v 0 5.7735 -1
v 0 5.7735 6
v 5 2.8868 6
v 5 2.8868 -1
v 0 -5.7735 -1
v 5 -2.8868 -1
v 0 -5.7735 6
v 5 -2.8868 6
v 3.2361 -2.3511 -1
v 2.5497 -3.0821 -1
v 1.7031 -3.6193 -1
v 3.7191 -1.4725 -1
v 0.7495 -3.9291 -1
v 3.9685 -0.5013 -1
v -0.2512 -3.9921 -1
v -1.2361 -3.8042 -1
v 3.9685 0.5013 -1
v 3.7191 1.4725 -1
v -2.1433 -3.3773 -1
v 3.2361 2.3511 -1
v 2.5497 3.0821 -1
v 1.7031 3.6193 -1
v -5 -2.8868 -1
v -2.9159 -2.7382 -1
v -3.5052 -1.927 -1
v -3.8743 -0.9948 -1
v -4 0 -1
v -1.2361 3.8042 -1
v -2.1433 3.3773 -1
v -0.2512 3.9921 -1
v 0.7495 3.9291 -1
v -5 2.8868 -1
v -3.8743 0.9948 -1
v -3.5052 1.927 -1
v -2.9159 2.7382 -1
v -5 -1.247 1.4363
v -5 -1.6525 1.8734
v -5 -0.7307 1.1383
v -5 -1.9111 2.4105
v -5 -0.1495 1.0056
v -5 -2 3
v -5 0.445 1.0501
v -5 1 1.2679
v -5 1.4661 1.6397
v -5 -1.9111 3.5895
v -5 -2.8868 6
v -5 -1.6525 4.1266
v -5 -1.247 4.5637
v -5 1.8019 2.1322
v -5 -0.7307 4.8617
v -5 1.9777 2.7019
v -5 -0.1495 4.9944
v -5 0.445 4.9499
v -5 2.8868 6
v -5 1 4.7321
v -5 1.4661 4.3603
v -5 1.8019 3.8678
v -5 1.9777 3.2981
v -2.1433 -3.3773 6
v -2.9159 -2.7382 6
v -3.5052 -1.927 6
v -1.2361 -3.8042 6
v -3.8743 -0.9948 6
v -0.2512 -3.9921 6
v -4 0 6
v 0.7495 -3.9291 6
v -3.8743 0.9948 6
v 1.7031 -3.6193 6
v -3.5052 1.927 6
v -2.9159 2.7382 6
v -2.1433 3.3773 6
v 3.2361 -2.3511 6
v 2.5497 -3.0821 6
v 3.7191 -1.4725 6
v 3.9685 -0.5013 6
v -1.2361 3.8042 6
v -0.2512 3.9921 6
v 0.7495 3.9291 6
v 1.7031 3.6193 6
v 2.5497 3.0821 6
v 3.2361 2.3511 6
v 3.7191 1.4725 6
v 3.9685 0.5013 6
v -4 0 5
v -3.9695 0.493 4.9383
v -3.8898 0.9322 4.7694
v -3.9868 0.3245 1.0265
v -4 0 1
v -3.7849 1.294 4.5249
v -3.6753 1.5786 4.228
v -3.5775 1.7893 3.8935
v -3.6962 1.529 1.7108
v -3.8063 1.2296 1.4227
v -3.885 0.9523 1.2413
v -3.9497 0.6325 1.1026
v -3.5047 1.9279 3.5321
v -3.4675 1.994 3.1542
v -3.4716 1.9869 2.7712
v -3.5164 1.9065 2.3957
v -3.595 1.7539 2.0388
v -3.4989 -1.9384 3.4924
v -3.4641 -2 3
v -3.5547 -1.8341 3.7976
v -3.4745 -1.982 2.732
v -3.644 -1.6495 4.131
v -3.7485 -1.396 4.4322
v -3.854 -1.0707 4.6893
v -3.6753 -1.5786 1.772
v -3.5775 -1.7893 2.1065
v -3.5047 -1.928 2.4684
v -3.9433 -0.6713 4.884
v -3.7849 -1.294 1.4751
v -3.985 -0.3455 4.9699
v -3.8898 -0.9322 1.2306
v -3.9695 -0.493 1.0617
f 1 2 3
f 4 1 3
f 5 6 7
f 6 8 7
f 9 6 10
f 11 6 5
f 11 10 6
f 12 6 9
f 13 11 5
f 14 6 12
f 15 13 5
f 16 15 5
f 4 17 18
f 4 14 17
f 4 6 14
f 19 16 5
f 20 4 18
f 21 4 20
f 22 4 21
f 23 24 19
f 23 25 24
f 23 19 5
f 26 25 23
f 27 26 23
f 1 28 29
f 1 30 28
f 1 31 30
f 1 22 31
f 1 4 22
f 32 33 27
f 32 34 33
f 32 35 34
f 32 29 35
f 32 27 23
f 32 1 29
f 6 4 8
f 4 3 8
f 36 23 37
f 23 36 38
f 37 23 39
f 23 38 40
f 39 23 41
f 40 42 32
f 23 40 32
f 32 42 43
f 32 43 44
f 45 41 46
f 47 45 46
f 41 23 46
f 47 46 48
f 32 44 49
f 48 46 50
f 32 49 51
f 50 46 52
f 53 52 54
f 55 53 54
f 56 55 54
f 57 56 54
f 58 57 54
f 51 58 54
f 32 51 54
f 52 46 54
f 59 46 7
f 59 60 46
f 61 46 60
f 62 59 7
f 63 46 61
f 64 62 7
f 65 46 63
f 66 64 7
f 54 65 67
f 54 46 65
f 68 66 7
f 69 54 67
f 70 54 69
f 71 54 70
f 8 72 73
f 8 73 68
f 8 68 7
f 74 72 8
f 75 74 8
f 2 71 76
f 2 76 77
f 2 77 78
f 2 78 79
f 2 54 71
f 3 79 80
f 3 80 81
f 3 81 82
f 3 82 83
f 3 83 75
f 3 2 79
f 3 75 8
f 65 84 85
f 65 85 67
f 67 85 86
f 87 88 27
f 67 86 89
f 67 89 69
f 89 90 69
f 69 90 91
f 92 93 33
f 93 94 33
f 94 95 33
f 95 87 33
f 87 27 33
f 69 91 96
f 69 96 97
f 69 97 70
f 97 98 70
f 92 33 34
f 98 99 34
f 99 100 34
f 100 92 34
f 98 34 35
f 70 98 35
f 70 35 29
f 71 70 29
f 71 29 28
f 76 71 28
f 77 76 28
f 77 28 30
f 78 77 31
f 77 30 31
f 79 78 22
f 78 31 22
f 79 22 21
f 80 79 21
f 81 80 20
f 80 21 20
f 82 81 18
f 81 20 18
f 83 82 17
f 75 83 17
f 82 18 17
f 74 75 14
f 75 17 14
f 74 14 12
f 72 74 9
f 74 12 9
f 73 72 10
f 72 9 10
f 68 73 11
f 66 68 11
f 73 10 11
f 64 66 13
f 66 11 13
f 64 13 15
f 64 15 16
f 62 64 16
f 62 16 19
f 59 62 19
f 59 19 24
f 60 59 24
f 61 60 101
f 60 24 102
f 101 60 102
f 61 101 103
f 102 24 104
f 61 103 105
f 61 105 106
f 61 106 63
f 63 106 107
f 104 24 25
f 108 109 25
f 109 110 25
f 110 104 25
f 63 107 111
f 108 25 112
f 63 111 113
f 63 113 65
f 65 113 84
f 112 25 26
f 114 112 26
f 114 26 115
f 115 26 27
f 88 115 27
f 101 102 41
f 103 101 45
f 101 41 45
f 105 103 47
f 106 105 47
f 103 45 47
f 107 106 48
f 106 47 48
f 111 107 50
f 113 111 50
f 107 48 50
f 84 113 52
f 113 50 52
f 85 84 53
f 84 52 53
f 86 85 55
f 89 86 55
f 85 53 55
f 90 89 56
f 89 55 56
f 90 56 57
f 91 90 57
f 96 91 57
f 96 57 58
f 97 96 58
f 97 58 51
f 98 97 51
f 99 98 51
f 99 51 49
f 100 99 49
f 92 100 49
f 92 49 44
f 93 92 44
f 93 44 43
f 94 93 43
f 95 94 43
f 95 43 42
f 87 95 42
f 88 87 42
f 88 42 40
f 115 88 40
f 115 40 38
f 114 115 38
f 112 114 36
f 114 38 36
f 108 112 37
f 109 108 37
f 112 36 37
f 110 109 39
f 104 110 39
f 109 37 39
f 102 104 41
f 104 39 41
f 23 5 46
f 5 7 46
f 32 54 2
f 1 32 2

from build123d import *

# Parameters (mm, degrees)
BOSS_EXTRUDE1_DEPTH = 6
SKETCH3_R           = 2
CUT_EXTRUDE1_DEPTH  = 2.5
CUT_EXTRUDE5_REACH  = 11.713
SKETCH5_R           = 2
SKETCH6_R           = 2
BOSS_EXTRUDE2_DEPTH = 1
CUT_EXTRUDE6_REACH  = 12.36
SKETCH7_R           = 4


with BuildPart() as part:
    # Sketch2 → Boss-Extrude1 (new body)
    with BuildSketch(Plane.XY):
        Polygon((0, -5.773502692), (5, -2.886751346), (5, 2.886751346), (0, 5.773502692), (-5, 2.886751346), (-5, -2.886751346), align=None)
    extrude(amount=BOSS_EXTRUDE1_DEPTH)

    # Sketch3 → Cut-Extrude1 (cut)
    with BuildSketch(Plane.ZY.offset(5)):
        with Locations(Location((3, 0, 0), (0, 0, 270))):
            Circle(SKETCH3_R)
    extrude(amount=-CUT_EXTRUDE1_DEPTH, mode=Mode.SUBTRACT)

    # Sketch5 → Cut-Extrude5 (cut, up to next)
    with BuildSketch(Plane.XY.offset(6), mode=Mode.PRIVATE) as cut_extrude5_sk1:
        Circle(SKETCH5_R)
    cut_extrude5_tool1 = extrude(cut_extrude5_sk1.sketch, amount=-CUT_EXTRUDE5_REACH, mode=Mode.PRIVATE) & part.part
    add(cut_extrude5_tool1.solids().sort_by_distance((0, 0, 6))[0], mode=Mode.SUBTRACT)

    # Sketch6 → Boss-Extrude2 (add)
    with BuildSketch(Plane(origin=(0, 0, 0), x_dir=(-1, 0, 0), z_dir=(0, 0, -1))):
        Polygon((0, 5.773502692), (-5, 2.886751346), (-5, -2.886751346), (0, -5.773502692), (5, -2.886751346), (5, 2.886751346), align=None)
        with Locations(Location((0, 0, 0), (0, 0, 180))):
            Circle(SKETCH6_R, mode=Mode.SUBTRACT)
    extrude(amount=BOSS_EXTRUDE2_DEPTH)

    # Sketch7 → Cut-Extrude6 (cut, up to next)
    with BuildSketch(Plane(origin=(0, 0, -1), x_dir=(-1, 0, 0), z_dir=(0, 0, -1)), mode=Mode.PRIVATE) as cut_extrude6_sk1:
        Circle(SKETCH7_R)
    cut_extrude6_tool1 = extrude(cut_extrude6_sk1.sketch, amount=-CUT_EXTRUDE6_REACH, mode=Mode.PRIVATE) & part.part
    add(cut_extrude6_tool1.solids().sort_by_distance((0, 0, -1))[0], mode=Mode.SUBTRACT)


solid = part.part
